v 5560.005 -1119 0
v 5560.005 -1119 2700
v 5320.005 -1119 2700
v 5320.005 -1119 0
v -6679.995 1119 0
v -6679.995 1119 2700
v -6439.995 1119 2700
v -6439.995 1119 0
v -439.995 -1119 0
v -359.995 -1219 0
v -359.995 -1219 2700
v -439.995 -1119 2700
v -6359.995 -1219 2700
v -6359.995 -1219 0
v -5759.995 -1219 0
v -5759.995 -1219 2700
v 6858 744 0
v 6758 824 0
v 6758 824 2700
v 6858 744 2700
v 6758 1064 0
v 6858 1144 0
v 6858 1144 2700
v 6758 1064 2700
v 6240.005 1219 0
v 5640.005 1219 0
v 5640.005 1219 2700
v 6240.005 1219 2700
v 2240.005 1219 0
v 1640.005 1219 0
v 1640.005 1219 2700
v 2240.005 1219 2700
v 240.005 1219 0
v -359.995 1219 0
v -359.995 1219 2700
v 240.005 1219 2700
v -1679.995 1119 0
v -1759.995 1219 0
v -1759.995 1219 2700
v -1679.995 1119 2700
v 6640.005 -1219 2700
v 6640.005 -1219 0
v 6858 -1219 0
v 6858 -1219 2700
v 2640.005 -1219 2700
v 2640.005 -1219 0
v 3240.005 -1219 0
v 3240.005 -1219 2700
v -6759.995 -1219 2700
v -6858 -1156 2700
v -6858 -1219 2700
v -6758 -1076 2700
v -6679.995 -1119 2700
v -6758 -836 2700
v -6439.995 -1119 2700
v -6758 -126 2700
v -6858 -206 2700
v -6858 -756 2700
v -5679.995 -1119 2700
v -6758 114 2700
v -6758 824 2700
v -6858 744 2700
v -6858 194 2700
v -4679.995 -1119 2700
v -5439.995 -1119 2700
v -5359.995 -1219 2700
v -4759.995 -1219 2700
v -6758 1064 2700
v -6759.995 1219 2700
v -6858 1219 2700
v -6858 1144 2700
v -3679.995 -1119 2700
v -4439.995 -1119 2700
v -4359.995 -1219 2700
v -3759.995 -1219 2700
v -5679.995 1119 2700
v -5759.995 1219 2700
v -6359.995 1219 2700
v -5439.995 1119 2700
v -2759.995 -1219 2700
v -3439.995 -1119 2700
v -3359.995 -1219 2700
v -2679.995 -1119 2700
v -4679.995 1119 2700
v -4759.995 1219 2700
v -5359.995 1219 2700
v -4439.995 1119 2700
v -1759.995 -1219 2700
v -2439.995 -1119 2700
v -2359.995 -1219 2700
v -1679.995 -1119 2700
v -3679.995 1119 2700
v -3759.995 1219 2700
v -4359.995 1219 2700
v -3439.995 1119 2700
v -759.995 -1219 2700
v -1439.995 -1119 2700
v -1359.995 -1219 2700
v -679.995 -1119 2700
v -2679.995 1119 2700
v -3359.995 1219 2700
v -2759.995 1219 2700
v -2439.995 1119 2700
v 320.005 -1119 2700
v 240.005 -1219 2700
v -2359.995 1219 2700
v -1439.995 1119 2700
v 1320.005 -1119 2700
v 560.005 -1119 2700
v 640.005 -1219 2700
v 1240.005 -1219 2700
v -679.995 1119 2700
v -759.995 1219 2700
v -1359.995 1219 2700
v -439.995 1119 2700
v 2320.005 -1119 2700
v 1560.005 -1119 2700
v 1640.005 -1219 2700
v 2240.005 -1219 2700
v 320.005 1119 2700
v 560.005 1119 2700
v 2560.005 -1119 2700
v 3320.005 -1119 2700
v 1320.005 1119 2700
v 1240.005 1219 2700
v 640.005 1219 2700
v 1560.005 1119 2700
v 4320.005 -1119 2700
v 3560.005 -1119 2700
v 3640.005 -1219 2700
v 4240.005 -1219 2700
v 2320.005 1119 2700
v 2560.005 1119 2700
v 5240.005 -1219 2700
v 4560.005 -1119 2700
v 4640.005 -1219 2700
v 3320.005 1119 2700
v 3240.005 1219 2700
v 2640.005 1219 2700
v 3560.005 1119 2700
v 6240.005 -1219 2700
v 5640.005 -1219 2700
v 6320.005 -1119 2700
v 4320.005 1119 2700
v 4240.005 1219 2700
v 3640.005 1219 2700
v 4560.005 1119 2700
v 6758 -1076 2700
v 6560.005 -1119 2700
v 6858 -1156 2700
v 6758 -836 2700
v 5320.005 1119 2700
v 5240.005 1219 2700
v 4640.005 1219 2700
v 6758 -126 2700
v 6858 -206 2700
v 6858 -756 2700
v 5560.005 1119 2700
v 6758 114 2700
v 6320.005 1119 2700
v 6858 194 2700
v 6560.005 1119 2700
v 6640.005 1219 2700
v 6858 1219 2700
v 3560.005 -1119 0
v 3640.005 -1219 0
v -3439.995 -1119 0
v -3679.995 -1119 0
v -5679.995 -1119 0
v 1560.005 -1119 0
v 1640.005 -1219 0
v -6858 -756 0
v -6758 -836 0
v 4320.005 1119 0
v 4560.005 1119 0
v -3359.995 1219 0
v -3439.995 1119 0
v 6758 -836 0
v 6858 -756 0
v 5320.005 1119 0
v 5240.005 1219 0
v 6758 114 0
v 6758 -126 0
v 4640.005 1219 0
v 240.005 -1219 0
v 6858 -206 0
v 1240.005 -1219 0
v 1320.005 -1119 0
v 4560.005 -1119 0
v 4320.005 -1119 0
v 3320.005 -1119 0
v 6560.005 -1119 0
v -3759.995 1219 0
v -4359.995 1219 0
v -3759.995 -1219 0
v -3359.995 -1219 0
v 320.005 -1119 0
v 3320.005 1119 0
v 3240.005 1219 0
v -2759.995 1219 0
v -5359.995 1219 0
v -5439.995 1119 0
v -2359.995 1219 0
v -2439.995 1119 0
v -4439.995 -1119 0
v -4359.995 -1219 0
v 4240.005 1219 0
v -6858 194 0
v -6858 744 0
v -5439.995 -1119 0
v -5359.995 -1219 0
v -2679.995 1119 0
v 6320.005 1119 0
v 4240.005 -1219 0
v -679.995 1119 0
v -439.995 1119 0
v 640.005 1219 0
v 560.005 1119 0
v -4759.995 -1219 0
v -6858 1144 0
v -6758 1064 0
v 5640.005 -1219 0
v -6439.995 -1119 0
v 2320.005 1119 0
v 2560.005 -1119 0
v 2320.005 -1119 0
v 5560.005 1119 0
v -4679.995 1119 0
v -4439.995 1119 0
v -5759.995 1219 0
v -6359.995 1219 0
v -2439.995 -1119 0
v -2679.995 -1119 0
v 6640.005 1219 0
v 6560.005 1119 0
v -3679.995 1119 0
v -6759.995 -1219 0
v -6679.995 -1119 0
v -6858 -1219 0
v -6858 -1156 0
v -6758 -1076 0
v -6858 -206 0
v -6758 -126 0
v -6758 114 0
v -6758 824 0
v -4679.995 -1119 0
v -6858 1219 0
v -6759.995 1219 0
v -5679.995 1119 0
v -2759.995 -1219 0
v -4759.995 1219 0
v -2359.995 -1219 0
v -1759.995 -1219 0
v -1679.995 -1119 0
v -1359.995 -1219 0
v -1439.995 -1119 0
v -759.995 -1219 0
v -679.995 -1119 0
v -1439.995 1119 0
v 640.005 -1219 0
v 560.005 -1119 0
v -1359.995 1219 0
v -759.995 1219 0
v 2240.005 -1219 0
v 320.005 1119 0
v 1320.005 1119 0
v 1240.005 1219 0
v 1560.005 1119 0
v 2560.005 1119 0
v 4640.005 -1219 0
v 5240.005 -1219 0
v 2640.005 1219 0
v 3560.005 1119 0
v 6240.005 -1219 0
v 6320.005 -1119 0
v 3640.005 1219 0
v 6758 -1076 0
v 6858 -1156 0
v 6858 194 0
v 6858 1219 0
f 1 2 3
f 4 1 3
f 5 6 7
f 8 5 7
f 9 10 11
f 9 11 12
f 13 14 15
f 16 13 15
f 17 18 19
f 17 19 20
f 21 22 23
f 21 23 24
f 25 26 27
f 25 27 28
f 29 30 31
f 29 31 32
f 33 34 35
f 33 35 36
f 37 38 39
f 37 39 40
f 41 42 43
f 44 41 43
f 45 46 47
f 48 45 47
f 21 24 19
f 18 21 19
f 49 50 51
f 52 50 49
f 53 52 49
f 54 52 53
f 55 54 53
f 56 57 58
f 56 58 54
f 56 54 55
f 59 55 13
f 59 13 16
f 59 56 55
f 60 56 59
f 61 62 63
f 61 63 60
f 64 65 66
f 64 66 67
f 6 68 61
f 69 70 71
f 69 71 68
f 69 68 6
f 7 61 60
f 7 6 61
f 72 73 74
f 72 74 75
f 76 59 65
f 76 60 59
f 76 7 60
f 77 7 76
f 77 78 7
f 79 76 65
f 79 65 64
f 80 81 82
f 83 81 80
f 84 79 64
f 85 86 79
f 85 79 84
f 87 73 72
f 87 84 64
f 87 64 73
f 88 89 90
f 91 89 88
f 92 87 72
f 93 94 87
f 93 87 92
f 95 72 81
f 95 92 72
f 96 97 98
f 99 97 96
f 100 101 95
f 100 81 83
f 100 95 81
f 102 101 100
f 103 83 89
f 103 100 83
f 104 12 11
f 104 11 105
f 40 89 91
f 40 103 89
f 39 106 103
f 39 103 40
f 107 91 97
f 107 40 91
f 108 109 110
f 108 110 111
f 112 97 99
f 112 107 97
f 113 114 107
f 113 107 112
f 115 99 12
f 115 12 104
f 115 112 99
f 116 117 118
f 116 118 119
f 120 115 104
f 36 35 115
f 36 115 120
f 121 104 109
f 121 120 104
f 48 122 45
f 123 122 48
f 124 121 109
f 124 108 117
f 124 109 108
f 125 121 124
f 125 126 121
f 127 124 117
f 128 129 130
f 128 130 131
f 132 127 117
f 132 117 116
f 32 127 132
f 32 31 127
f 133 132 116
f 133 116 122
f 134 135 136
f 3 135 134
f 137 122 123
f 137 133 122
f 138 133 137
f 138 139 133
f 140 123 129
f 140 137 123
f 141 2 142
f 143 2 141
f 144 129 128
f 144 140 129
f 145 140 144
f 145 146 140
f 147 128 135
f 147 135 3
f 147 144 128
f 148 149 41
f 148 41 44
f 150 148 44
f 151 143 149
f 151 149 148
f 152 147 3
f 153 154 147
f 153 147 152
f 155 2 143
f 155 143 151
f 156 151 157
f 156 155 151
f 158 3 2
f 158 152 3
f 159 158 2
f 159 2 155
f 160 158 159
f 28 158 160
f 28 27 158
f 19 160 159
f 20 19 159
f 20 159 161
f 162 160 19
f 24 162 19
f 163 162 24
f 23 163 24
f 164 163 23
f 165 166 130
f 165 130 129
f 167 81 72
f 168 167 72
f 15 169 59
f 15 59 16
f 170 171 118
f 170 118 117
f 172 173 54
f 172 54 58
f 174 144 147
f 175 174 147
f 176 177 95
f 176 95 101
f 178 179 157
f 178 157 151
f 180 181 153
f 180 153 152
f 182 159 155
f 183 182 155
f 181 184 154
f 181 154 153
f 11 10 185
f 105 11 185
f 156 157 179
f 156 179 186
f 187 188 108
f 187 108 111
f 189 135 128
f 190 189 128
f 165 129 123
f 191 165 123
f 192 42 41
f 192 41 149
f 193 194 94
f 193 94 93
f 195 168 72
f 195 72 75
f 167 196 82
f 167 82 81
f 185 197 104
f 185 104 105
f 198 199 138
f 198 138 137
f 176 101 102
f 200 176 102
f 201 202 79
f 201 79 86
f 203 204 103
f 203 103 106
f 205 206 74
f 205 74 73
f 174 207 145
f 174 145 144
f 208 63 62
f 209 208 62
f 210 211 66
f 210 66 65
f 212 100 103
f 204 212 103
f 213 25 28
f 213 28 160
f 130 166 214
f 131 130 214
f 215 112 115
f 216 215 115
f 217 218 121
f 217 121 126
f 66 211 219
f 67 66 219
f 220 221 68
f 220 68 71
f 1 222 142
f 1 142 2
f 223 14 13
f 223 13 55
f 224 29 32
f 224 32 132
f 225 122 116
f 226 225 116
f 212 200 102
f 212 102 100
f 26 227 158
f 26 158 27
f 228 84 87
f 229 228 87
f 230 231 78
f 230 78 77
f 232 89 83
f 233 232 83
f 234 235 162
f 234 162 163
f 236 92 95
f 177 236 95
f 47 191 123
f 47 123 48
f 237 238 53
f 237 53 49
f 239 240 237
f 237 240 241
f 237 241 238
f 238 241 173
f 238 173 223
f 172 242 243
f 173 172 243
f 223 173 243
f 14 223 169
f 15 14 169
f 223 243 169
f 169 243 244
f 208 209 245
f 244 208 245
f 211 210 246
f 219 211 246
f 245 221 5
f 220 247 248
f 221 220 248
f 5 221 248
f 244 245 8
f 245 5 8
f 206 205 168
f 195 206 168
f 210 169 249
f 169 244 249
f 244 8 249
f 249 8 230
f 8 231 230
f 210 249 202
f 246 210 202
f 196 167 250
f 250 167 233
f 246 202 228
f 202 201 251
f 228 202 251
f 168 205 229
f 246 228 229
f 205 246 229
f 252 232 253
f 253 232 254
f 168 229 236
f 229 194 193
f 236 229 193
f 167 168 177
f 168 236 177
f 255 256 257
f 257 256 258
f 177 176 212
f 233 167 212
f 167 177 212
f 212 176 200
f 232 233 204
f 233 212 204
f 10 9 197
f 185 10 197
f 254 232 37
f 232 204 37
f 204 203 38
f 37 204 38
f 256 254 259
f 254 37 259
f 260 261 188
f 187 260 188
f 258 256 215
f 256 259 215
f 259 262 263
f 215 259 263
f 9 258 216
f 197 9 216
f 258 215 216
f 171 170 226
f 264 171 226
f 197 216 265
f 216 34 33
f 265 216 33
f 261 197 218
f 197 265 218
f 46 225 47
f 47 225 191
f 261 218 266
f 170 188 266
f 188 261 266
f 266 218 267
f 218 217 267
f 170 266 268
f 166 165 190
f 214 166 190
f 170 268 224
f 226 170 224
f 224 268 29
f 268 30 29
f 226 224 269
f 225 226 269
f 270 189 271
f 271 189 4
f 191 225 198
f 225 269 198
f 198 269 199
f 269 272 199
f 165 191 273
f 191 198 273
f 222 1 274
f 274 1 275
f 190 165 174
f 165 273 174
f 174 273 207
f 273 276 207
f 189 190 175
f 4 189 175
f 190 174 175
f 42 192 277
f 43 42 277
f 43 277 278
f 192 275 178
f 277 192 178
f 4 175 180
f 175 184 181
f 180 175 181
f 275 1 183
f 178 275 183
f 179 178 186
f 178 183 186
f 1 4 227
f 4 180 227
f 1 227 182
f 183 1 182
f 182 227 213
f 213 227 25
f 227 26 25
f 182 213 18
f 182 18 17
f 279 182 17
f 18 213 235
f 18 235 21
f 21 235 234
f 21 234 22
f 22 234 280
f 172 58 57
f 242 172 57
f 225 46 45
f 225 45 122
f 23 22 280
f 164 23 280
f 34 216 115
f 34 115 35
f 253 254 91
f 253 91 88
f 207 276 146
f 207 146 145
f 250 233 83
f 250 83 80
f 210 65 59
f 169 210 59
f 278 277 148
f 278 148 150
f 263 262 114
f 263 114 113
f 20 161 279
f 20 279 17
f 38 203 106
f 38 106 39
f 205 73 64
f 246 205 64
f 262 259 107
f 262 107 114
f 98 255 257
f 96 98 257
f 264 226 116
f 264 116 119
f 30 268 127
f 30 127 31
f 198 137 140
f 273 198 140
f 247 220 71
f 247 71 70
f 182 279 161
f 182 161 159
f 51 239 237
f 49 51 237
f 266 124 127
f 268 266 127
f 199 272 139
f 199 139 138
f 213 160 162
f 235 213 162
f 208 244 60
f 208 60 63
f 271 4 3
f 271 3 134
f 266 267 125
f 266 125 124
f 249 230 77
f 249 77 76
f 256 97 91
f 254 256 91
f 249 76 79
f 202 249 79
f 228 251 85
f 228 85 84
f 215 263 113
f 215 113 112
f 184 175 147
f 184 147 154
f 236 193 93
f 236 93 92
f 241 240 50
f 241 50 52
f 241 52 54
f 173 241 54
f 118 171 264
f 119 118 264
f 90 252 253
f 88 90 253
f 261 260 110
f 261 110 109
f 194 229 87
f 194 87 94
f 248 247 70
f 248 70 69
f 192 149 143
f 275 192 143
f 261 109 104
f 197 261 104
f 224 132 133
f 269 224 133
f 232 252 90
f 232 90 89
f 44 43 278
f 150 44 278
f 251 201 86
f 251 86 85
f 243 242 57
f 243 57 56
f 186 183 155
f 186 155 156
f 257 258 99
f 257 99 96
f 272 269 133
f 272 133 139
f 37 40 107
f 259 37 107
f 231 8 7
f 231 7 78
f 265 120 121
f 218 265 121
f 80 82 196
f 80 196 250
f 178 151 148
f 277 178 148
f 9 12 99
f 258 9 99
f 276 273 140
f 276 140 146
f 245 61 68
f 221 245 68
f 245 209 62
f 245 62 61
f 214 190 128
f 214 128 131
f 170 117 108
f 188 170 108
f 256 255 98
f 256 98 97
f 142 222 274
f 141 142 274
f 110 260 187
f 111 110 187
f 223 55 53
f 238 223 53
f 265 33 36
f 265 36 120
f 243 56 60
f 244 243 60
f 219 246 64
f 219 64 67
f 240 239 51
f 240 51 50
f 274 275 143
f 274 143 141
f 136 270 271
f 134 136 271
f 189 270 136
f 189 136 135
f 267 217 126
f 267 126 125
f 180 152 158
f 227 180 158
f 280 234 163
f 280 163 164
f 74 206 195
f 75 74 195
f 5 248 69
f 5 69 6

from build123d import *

# Parameters (mm, degrees)
F0_W     = 13716
F0_H     = 2438
F1_DEPTH = 2700
F3_DEPTH = 2700


with BuildPart() as f1:
    # F0 (on Top) → F1 (new body)
    with BuildSketch(Plane.XY):
        Rectangle(F0_W, F0_H)
    extrude(amount=F1_DEPTH)

    # F2 (on face) → F3 (cut, through all)
    with BuildSketch(Plane.XY.offset(2700)):
        Polygon((-6559.995461, 1219), (-6759.995461, 1219), (-6679.995461, 1119), (-6559.995461, 1119), (-6439.995461, 1119), (-6359.995461, 1219), align=None)
        Polygon((-5559.995461, 1219), (-5759.995461, 1219), (-5679.995461, 1119), (-5559.995461, 1119), (-5439.995461, 1119), (-5359.995461, 1219), align=None)
        Polygon((-4559.995461, 1219), (-4759.995461, 1219), (-4679.995461, 1119), (-4559.995461, 1119), (-4439.995461, 1119), (-4359.995461, 1219), align=None)
        Polygon((-6679.995461, -1119), (-6759.995461, -1219), (-6559.995461, -1219), (-6359.995461, -1219), (-6439.995461, -1119), (-6559.995461, -1119), align=None)
        Polygon((-5679.995461, -1119), (-5759.995461, -1219), (-5559.995461, -1219), (-5359.995461, -1219), (-5439.995461, -1119), (-5559.995461, -1119), align=None)
        Polygon((-4679.995461, -1119), (-4759.995461, -1219), (-4559.995461, -1219), (-4359.995461, -1219), (-4439.995461, -1119), (-4559.995461, -1119), align=None)
        Polygon((-3679.995461, -1119), (-3759.995461, -1219), (-3559.995461, -1219), (-3359.995461, -1219), (-3439.995461, -1119), (-3559.995461, -1119), align=None)
        Polygon((-2679.995461, -1119), (-2759.995461, -1219), (-2559.995461, -1219), (-2359.995461, -1219), (-2439.995461, -1119), (-2559.995461, -1119), align=None)
        Polygon((-2559.995461, 1219), (-2759.995461, 1219), (-2679.995461, 1119), (-2559.995461, 1119), (-2439.995461, 1119), (-2359.995461, 1219), align=None)
        Polygon((-1559.995461, 1219), (-1759.995461, 1219), (-1679.995461, 1119), (-1559.995461, 1119), (-1439.995461, 1119), (-1359.995461, 1219), align=None)
        Polygon((-3559.995461, 1219), (-3759.995461, 1219), (-3679.995461, 1119), (-3559.995461, 1119), (-3439.995461, 1119), (-3359.995461, 1219), align=None)
        Polygon((-1679.995461, -1119), (-1759.995461, -1219), (-1559.995461, -1219), (-1359.995461, -1219), (-1439.995461, -1119), (-1559.995461, -1119), align=None)
        Polygon((-679.995461, -1119), (-759.995461, -1219), (-559.995461, -1219), (-359.995461, -1219), (-439.995461, -1119), (-559.995461, -1119), align=None)
        Polygon((-559.995461, 1219), (-759.995461, 1219), (-679.995461, 1119), (-559.995461, 1119), (-439.995461, 1119), (-359.995461, 1219), align=None)
        Polygon((440.004539, 1219), (240.004539, 1219), (320.004539, 1119), (440.004539, 1119), (560.004539, 1119), (640.004539, 1219), align=None)
        Polygon((1440.004539, 1219), (1240.004539, 1219), (1320.004539, 1119), (1440.004539, 1119), (1560.004539, 1119), (1640.004539, 1219), align=None)
        Polygon((320.004539, -1119), (240.004539, -1219), (440.004539, -1219), (640.004539, -1219), (560.004539, -1119), (440.004539, -1119), align=None)
        Polygon((1320.004539, -1119), (1240.004539, -1219), (1440.004539, -1219), (1640.004539, -1219), (1560.004539, -1119), (1440.004539, -1119), align=None)
        Polygon((2320.004539, -1119), (2240.004539, -1219), (2440.004539, -1219), (2640.004539, -1219), (2560.004539, -1119), (2440.004539, -1119), align=None)
        Polygon((2440.004539, 1219), (2240.004539, 1219), (2320.004539, 1119), (2440.004539, 1119), (2560.004539, 1119), (2640.004539, 1219), align=None)
        Polygon((3440.004539, 1219), (3240.004539, 1219), (3320.004539, 1119), (3440.004539, 1119), (3560.004539, 1119), (3640.004539, 1219), align=None)
        Polygon((4440.004539, 1219), (4240.004539, 1219), (4320.004539, 1119), (4440.004539, 1119), (4560.004539, 1119), (4640.004539, 1219), align=None)
        Polygon((5440.004539, 1219), (5240.004539, 1219), (5320.004539, 1119), (5440.004539, 1119), (5560.004539, 1119), (5640.004539, 1219), align=None)
        Polygon((5320.004539, -1119), (5240.004539, -1219), (5440.004539, -1219), (5640.004539, -1219), (5560.004539, -1119), (5440.004539, -1119), align=None)
        Polygon((4320.004539, -1119), (4240.004539, -1219), (4440.004539, -1219), (4640.004539, -1219), (4560.004539, -1119), (4440.004539, -1119), align=None)
        Polygon((3320.004539, -1119), (3240.004539, -1219), (3440.004539, -1219), (3640.004539, -1219), (3560.004539, -1119), (3440.004539, -1119), align=None)
        Polygon((6440.004539, 1219), (6240.004539, 1219), (6320.004539, 1119), (6440.004539, 1119), (6560.004539, 1119), (6640.004539, 1219), align=None)
        Polygon((6320.004539, -1119), (6240.004539, -1219), (6440.004539, -1219), (6640.004539, -1219), (6560.004539, -1119), (6440.004539, -1119), align=None)
        Polygon((6858, 944), (6858, 1144), (6758, 1064), (6758, 944), (6758, 824), (6858, 744), align=None)
        Polygon((6858, -6), (6858, 194), (6758, 114), (6758, -6), (6758, -126), (6858, -206), align=None)
        Polygon((6858, -956), (6858, -756), (6758, -836), (6758, -956), (6758, -1076), (6858, -1156), align=None)
        Polygon((-6758, 1064), (-6858, 1144), (-6858, 944), (-6858, 744), (-6758, 824), (-6758, 944), align=None)
        Polygon((-6758, 114), (-6858, 194), (-6858, -6), (-6858, -206), (-6758, -126), (-6758, -6), align=None)
        Polygon((-6758, -836), (-6858, -756), (-6858, -956), (-6858, -1156), (-6758, -1076), (-6758, -956), align=None)
    extrude(amount=-F3_DEPTH, mode=Mode.SUBTRACT)


solid = f1.part
